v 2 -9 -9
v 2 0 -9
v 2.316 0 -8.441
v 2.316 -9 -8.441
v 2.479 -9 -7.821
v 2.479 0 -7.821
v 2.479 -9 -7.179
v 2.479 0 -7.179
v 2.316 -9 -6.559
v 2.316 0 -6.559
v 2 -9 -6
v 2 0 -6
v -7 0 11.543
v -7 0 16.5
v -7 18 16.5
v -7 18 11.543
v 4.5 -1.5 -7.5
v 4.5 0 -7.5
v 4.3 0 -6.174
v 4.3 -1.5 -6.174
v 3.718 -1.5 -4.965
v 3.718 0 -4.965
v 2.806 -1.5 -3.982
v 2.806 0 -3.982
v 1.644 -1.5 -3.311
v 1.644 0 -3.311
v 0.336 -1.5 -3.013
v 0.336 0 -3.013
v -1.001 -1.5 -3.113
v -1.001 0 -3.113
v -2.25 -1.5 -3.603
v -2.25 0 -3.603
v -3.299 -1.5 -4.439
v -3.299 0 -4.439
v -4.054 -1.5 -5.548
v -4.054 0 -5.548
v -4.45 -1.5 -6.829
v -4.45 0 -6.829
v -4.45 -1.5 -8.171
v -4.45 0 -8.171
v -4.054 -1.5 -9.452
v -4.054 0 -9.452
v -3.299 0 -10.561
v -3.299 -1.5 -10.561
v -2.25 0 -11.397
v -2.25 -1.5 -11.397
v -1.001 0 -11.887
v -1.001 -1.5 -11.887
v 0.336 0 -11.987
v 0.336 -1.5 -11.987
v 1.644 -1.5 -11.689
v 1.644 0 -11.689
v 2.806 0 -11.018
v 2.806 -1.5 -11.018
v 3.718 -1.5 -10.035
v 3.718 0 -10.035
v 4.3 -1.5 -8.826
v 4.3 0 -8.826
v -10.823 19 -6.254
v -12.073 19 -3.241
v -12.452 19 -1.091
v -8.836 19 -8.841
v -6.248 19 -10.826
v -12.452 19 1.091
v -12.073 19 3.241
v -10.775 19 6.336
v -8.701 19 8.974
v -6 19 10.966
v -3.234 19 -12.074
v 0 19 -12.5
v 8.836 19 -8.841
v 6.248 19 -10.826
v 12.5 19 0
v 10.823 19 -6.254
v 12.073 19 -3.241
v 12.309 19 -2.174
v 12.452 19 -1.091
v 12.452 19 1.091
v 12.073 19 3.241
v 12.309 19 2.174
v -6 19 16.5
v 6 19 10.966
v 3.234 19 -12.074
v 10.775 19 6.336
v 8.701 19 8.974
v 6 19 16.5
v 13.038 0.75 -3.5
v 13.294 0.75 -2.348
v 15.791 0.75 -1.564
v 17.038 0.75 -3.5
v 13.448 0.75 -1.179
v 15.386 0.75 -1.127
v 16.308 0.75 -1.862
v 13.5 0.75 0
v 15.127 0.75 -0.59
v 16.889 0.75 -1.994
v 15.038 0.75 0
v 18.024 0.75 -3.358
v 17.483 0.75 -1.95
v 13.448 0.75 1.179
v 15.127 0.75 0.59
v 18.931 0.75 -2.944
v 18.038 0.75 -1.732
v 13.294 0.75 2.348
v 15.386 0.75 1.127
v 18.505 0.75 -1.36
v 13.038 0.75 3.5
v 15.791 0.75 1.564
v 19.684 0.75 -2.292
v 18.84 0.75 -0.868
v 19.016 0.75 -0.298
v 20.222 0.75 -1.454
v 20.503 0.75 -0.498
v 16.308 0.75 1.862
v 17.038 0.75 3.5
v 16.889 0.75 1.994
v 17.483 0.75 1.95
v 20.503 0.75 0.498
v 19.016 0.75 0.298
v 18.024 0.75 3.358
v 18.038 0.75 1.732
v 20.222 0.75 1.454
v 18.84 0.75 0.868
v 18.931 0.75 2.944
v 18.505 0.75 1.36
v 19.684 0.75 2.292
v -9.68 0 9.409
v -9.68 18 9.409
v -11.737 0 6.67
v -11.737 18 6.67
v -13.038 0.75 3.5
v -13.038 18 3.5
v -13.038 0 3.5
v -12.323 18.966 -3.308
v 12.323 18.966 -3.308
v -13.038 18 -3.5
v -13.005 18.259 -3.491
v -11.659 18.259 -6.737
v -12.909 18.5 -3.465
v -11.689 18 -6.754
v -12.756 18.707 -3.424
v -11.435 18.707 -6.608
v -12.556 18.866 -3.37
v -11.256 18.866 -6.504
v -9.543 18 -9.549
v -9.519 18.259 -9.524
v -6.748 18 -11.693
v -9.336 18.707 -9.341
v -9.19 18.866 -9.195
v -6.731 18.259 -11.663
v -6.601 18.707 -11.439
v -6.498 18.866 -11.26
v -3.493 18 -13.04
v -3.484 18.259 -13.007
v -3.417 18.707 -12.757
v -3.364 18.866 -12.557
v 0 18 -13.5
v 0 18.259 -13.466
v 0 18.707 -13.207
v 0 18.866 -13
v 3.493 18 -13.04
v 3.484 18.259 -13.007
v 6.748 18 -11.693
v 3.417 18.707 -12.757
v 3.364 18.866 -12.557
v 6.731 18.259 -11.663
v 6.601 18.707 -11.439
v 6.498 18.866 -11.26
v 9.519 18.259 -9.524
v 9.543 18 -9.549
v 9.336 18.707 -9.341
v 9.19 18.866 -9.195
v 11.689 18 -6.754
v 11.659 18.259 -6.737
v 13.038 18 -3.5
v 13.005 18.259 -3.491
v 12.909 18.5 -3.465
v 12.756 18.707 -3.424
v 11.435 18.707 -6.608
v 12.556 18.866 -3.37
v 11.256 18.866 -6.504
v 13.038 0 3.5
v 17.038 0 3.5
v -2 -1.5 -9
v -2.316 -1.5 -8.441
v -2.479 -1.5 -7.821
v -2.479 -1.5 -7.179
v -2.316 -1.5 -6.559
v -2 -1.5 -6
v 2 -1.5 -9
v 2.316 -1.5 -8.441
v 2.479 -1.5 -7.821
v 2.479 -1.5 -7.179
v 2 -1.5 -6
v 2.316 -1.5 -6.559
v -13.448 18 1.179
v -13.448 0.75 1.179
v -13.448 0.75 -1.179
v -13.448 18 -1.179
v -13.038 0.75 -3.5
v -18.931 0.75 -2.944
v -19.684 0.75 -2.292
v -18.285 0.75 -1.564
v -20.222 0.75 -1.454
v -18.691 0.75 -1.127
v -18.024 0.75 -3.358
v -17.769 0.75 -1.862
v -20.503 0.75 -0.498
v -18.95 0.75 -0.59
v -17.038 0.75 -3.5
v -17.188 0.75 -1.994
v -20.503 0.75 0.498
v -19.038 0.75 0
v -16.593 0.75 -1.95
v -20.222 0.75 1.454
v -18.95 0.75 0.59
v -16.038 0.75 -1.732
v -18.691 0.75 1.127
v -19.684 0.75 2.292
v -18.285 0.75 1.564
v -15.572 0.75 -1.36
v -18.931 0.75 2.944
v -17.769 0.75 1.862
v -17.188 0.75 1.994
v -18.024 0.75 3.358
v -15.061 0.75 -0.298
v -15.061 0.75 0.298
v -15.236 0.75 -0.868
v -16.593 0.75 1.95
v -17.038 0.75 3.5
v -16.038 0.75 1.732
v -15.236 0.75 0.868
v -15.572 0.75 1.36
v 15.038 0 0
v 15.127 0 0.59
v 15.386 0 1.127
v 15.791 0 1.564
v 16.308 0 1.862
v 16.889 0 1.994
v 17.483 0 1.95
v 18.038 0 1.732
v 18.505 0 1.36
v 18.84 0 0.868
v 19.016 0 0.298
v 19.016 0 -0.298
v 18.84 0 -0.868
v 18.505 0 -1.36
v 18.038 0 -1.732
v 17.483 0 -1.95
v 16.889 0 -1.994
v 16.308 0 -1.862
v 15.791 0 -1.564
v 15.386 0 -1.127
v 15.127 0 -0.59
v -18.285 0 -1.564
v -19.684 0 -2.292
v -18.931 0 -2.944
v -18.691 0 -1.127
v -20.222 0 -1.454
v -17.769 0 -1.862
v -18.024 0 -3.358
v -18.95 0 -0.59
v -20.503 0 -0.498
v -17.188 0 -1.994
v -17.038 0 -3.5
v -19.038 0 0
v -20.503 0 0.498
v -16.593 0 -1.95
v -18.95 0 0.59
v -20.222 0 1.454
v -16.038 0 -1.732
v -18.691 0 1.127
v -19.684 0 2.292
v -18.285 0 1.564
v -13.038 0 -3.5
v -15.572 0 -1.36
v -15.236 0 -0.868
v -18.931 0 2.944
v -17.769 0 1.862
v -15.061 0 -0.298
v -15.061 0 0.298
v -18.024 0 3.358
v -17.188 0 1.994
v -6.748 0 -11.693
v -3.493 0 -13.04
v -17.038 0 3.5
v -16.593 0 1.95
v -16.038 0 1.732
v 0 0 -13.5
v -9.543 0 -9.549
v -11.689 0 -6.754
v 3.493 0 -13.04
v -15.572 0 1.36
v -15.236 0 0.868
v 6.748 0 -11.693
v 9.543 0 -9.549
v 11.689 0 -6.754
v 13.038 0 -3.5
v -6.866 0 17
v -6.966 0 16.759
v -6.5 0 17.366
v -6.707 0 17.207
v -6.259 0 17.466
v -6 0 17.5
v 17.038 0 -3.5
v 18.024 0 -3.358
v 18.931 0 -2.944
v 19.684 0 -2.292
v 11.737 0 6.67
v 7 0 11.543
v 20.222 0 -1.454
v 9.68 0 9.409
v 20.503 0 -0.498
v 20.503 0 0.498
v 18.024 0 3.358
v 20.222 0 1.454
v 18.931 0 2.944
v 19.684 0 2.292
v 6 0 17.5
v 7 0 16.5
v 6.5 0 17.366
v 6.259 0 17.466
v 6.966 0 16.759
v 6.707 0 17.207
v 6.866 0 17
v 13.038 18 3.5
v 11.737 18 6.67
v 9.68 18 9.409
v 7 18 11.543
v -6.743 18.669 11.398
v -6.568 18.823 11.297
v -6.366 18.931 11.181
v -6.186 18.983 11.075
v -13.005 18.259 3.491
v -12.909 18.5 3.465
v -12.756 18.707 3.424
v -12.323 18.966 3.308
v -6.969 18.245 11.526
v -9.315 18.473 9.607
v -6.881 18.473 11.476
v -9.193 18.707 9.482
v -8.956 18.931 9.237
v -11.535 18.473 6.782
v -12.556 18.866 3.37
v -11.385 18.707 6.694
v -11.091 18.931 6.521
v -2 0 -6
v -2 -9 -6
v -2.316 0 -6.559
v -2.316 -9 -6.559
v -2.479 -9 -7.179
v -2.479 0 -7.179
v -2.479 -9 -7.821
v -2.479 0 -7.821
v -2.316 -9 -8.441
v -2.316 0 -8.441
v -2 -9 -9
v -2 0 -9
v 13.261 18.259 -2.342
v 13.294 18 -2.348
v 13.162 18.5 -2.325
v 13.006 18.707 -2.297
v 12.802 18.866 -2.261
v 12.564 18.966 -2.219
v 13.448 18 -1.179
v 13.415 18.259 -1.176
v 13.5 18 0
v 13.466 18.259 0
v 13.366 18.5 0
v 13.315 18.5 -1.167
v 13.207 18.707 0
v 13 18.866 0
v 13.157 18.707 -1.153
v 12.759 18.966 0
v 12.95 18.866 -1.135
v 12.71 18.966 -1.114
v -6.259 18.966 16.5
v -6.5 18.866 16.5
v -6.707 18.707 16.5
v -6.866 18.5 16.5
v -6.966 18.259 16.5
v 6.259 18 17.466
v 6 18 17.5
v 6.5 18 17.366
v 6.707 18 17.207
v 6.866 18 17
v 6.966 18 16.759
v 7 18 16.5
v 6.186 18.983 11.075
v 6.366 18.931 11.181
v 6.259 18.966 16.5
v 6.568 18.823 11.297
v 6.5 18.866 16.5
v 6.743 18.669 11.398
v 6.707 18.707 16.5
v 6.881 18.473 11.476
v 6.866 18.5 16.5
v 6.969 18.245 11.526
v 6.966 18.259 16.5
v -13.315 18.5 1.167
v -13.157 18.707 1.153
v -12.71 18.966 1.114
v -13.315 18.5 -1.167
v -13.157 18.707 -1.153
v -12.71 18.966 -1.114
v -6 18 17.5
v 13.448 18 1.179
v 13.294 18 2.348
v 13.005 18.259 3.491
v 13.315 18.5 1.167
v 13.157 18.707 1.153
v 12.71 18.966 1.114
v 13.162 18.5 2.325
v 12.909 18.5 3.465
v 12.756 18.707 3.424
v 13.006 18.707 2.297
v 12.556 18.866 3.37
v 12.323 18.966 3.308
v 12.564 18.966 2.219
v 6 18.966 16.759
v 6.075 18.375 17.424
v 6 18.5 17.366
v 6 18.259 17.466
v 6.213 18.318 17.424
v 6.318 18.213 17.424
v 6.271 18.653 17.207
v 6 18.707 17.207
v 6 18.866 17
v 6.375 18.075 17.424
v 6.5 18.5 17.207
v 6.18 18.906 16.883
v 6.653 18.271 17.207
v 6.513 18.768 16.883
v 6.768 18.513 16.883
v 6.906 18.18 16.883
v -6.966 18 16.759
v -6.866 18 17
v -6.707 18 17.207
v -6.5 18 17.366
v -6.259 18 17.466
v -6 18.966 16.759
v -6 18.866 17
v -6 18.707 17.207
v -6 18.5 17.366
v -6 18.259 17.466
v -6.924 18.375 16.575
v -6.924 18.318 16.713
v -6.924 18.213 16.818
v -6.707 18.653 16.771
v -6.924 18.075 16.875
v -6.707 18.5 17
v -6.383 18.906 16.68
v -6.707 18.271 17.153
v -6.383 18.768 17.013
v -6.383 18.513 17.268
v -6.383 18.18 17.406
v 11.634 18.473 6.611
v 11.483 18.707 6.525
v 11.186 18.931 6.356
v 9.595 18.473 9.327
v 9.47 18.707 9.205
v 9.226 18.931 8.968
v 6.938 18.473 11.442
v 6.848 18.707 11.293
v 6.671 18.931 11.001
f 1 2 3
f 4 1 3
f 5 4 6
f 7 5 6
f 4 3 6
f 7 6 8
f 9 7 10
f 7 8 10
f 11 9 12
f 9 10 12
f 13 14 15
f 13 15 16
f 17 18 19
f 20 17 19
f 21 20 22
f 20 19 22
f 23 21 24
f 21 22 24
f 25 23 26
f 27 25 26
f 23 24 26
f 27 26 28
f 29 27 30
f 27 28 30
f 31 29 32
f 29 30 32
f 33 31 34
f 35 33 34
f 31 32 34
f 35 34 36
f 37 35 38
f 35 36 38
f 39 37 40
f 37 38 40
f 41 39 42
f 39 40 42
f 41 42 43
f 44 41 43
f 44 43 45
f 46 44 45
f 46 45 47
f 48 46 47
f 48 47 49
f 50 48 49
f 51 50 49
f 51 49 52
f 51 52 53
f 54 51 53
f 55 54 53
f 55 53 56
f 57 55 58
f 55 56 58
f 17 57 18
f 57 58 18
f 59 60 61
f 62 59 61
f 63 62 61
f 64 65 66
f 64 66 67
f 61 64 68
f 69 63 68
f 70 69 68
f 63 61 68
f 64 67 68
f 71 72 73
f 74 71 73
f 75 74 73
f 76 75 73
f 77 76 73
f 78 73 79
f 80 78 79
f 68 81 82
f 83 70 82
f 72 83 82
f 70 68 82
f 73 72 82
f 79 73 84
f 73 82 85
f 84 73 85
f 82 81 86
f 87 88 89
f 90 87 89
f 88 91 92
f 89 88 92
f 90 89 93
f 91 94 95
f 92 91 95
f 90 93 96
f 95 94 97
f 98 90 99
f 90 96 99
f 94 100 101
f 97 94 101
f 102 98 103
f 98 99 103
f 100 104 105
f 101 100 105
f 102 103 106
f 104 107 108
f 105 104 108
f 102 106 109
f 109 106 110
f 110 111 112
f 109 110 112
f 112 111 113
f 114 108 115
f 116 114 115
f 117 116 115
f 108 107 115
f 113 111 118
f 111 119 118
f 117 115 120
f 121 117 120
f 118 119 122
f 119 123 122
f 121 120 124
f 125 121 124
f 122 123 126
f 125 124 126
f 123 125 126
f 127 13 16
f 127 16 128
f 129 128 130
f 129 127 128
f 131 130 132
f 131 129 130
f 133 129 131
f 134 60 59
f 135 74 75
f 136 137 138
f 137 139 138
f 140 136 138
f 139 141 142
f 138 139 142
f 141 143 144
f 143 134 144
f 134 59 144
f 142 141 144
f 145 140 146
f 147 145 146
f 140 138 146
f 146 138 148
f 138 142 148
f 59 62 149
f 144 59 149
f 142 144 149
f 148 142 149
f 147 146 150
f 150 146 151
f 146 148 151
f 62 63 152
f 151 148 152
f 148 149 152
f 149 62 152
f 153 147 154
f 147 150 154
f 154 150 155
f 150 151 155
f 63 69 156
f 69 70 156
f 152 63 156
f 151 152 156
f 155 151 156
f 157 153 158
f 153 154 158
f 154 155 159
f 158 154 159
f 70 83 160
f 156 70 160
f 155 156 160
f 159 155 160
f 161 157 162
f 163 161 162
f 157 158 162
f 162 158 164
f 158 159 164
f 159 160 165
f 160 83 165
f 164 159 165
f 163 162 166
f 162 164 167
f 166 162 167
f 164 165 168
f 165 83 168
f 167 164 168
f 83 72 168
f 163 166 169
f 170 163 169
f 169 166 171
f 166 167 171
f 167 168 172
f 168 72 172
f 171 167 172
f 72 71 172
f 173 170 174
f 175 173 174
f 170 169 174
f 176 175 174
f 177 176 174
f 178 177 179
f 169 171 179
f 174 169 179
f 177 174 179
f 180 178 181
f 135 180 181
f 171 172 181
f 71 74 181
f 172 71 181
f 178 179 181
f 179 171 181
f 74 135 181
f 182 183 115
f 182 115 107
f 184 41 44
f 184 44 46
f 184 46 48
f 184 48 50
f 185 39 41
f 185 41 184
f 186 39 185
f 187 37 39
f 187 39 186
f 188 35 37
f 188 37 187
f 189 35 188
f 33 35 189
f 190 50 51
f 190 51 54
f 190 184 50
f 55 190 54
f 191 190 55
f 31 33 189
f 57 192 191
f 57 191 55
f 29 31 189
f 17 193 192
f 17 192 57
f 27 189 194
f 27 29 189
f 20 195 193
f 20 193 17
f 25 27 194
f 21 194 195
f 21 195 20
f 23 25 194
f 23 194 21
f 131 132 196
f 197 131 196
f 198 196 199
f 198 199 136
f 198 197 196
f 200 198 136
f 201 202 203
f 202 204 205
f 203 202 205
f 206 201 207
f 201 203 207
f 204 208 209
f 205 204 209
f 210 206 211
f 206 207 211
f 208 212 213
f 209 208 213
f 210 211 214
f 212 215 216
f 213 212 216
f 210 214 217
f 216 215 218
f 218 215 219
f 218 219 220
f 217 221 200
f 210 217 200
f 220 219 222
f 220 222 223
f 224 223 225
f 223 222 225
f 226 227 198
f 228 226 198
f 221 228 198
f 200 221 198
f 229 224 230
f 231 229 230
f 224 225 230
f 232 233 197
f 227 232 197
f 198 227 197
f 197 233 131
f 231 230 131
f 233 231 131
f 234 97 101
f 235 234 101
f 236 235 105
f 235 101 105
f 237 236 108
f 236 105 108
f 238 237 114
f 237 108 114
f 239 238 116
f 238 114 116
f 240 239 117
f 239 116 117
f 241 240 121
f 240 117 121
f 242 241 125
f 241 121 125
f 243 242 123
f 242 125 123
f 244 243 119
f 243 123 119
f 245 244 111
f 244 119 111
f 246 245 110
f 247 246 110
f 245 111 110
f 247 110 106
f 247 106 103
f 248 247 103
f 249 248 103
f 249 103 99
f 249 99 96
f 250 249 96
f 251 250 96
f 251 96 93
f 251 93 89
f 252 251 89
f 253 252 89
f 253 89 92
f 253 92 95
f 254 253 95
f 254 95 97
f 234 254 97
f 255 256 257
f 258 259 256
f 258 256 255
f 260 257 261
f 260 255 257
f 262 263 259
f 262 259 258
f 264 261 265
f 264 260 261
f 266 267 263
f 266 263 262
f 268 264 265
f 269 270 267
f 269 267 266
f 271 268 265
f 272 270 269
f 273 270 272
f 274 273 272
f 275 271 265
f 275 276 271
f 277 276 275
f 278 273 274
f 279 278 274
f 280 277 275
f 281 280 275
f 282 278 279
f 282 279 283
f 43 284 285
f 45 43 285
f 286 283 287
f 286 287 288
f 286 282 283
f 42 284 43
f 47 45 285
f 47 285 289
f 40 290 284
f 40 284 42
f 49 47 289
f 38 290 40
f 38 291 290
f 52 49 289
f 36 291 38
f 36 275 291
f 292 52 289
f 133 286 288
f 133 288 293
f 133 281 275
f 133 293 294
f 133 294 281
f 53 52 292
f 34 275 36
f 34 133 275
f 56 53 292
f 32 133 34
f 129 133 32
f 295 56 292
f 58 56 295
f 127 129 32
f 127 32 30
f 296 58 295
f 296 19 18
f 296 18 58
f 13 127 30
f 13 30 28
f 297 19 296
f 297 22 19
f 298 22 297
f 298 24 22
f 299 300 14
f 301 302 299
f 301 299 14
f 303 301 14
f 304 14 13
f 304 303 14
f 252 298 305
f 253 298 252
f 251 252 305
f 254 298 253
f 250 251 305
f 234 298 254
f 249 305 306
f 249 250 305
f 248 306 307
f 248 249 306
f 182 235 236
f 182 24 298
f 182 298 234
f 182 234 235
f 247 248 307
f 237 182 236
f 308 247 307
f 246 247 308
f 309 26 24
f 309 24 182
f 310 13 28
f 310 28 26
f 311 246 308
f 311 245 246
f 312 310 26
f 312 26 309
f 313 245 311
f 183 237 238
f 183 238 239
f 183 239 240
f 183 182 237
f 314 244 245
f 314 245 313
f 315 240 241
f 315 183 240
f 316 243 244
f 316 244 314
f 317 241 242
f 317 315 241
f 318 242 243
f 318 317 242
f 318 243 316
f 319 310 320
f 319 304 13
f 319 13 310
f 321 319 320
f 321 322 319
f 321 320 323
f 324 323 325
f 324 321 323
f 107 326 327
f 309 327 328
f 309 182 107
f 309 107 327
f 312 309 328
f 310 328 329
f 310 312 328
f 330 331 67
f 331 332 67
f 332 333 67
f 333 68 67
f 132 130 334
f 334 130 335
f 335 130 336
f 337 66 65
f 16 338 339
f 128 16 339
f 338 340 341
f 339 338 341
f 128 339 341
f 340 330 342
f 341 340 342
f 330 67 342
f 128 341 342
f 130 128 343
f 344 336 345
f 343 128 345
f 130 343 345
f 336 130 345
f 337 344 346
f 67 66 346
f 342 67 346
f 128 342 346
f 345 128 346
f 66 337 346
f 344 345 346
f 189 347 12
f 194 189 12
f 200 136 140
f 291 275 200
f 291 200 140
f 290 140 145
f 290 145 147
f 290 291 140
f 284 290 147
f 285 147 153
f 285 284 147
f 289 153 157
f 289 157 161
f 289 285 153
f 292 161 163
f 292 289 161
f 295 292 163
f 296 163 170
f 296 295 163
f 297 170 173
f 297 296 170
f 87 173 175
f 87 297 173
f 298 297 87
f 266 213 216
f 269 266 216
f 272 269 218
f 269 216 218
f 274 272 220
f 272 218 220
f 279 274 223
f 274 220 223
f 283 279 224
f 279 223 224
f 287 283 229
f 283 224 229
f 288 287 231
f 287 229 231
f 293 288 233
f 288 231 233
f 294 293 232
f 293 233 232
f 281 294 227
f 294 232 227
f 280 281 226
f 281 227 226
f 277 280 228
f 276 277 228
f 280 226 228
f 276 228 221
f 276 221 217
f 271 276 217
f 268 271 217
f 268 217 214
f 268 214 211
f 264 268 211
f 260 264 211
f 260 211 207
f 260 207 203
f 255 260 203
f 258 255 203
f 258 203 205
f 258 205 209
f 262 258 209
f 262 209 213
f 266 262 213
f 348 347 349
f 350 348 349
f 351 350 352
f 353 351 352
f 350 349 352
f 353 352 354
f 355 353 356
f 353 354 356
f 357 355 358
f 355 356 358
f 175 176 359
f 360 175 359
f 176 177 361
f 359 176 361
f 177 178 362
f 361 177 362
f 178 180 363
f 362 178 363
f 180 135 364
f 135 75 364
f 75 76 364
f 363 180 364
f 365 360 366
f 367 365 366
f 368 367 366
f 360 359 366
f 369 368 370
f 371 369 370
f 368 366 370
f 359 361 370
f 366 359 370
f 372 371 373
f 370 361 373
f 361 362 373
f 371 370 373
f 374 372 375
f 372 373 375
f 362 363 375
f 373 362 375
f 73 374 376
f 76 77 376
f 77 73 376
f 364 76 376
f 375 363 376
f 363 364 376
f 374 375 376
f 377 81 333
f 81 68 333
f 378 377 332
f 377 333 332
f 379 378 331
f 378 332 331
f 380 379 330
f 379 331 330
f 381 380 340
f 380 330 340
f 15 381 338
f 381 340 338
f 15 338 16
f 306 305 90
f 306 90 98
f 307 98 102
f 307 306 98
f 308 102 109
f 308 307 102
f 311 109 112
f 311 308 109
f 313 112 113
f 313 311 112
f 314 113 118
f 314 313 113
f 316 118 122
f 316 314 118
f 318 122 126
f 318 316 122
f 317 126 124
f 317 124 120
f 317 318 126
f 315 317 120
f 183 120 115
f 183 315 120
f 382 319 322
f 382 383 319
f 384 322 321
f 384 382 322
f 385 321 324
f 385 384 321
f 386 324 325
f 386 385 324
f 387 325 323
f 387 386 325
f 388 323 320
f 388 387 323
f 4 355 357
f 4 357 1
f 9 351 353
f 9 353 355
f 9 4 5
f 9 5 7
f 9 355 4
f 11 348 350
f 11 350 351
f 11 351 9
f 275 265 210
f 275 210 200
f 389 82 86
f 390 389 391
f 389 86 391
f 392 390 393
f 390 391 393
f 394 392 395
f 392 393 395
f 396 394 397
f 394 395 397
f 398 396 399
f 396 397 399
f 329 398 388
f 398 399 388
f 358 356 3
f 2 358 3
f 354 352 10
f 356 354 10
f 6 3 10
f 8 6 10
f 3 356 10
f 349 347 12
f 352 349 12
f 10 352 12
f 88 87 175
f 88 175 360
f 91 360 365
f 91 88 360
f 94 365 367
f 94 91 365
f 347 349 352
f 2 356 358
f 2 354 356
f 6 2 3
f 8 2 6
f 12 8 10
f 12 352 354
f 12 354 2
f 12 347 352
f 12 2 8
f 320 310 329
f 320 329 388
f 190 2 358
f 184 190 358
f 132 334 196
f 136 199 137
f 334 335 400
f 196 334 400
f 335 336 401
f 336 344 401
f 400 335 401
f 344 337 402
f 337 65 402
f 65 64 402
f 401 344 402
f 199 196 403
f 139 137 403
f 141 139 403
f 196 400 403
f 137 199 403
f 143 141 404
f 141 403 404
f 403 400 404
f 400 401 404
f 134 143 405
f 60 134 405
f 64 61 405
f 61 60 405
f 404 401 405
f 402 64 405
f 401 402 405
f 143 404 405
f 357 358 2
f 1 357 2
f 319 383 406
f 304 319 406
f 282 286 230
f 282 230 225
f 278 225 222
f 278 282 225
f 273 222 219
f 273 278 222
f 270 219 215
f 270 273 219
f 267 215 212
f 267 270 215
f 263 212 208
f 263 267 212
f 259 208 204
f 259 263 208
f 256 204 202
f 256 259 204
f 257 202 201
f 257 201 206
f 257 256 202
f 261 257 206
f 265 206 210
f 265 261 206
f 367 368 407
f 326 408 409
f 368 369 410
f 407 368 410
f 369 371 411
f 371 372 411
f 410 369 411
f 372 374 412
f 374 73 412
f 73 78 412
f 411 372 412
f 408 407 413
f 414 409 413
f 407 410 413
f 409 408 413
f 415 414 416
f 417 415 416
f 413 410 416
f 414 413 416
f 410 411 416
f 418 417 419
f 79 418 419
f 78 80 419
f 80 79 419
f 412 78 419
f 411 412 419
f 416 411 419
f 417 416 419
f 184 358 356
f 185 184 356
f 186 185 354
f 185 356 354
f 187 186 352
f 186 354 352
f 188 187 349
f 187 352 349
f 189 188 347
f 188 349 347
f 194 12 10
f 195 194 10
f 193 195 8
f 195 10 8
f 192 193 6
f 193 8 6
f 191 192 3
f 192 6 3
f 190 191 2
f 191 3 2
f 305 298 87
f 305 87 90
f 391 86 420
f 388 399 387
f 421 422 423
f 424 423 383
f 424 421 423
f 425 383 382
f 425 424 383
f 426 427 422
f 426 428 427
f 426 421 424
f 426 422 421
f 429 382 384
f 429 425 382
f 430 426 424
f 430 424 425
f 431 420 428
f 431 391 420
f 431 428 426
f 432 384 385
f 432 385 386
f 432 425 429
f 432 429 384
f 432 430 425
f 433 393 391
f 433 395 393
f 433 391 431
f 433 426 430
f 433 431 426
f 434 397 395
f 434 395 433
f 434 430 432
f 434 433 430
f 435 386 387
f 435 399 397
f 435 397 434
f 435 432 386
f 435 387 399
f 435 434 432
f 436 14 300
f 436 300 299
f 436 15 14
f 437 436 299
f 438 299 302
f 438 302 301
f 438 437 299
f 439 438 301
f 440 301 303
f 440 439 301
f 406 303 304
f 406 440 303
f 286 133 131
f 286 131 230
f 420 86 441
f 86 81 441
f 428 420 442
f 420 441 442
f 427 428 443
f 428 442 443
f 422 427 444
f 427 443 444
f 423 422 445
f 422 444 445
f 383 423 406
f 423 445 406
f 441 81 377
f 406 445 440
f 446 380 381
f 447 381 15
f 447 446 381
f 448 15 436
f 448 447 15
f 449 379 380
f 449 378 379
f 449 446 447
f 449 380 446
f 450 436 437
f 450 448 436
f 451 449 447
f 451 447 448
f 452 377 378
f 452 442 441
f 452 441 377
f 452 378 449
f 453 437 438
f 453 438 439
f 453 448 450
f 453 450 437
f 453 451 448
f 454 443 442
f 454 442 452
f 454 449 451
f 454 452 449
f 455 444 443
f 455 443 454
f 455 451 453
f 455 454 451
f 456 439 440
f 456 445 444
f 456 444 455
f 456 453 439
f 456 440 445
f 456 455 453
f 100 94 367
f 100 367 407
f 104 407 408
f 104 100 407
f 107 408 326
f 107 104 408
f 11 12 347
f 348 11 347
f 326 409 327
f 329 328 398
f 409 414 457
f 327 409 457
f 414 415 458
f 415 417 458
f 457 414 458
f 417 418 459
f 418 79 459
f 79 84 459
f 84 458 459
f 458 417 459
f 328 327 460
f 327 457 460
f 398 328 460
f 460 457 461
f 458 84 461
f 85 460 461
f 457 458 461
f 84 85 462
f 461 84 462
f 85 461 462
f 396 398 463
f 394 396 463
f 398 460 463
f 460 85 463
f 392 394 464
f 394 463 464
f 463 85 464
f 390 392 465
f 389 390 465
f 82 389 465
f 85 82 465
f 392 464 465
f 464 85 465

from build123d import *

# Parameters (mm, degrees)
F0_R     = 4.5
F1_DEPTH = 19
F2_DEPTH = 0.75
F3_DEPTH = 1.5
F4_DEPTH = 9
F5_D     = 4
F6_R     = 1


with BuildPart() as f1:
    # F0 (on Front) → F1 (new body)
    with BuildSketch(Plane.XZ):
        with BuildLine():
            ThreePointArc((13.038405, -3.5), (13.384104, -1.765154), (13.5, 0))
            ThreePointArc((13.5, 0), (13.384104, 1.765154), (13.038405, 3.5))
            ThreePointArc((13.038405, 3.5), (10.796225, 8.105031), (7, 11.543396))
            ThreePointArc((7, 11.543396), (0, 13.5), (-7, 11.543396))
            ThreePointArc((-7, 11.543396), (-10.796225, 8.105031), (-13.038405, 3.5))
            ThreePointArc((-13.038405, 3.5), (-13.5, 0), (-13.038405, -3.5))
            ThreePointArc((-13.038405, -3.5), (0, -13.5), (13.038405, -3.5))
        make_face()
        with Locations((0, -7.5)):
            Circle(F0_R, mode=Mode.SUBTRACT)
        with Locations((0, -7.5)):
            Circle(F0_R)
        with BuildLine():
            ThreePointArc((-2, -9), (-2.5, -7.5), (-2, -6))
            Line((-2, -6), (2, -6))
            ThreePointArc((2, -6), (2.5, -7.5), (2, -9))
            Line((2, -9), (-2, -9))
        make_face(mode=Mode.SUBTRACT)
        with BuildLine():
            Line((2, -6), (-2, -6))
            ThreePointArc((-2, -6), (-2.5, -7.5), (-2, -9))
            Line((-2, -9), (2, -9))
            ThreePointArc((2, -9), (2.5, -7.5), (2, -6))
        make_face()
        with BuildLine():
            ThreePointArc((-7, 11.543396), (0, 13.5), (7, 11.543396))
            Line((7, 11.543396), (7, 17.5))
            Line((7, 17.5), (-7, 17.5))
            Line((-7, 17.5), (-7, 11.543396))
        make_face()
    extrude(amount=-F1_DEPTH)

    # F0 (on Front) → F2 (join)
    with BuildSketch(Plane.XZ):
        with BuildLine():
            Line((-17.038405, -3.5), (-13.038405, -3.5))
            ThreePointArc((-13.038405, -3.5), (-13.5, 0), (-13.038405, 3.5))
            Line((-13.038405, 3.5), (-17.038405, 3.5))
            ThreePointArc((-17.038405, 3.5), (-20.538405, 0), (-17.038405, -3.5))
        make_face()
        with BuildLine():
            ThreePointArc((13.038405, 3.5), (13.384104, 1.765154), (13.5, 0))
            ThreePointArc((13.5, 0), (13.384104, -1.765154), (13.038405, -3.5))
            Line((13.038405, -3.5), (17.038405, -3.5))
            ThreePointArc((17.038405, -3.5), (20.538405, 0), (17.038405, 3.5))
            Line((17.038405, 3.5), (13.038405, 3.5))
        make_face()
    extrude(amount=-F2_DEPTH)

    # F0 (on Front) → F3 (join)
    with BuildSketch(Plane.XZ):
        with Locations((0, -7.5)):
            Circle(F0_R)
        with BuildLine():
            ThreePointArc((-2, -9), (-2.5, -7.5), (-2, -6))
            Line((-2, -6), (2, -6))
            ThreePointArc((2, -6), (2.5, -7.5), (2, -9))
            Line((2, -9), (-2, -9))
        make_face(mode=Mode.SUBTRACT)
    extrude(amount=F3_DEPTH)

    # F5 (through all)
    with Locations(Plane.XZ):
        with Locations((-17.038405, 0), (17.038405, 0)):
            Hole(F5_D / 2)

    # F6
    f6_edges = [f1.edges().sort_by_distance(p)[0] for p in [
        (0, 19, -13.5),
        (7, 19, 14.521698),
        (0, 19, 17.5),
        (-7, 19, 14.521698),
        (7, 9.5, 17.5),
        (-7, 9.5, 17.5),
    ]]
    fillet(f6_edges, radius=F6_R)


with BuildPart() as f4:
    # F0 (on Front) → F4 (new body)
    with BuildSketch(Plane.XZ):
        with BuildLine():
            Line((2, -6), (-2, -6))
            ThreePointArc((-2, -6), (-2.5, -7.5), (-2, -9))
            Line((-2, -9), (2, -9))
            ThreePointArc((2, -9), (2.5, -7.5), (2, -6))
        make_face()
    extrude(amount=F4_DEPTH)


solid = Compound([f1.part, f4.part])
